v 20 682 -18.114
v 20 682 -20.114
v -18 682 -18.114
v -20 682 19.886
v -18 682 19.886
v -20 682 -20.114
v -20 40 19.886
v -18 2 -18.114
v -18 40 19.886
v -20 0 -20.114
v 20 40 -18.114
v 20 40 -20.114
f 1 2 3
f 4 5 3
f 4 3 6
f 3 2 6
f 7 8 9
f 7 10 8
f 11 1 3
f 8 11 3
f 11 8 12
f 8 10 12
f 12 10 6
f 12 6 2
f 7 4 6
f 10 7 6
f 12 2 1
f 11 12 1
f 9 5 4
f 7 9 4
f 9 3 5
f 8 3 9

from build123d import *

# Parameters (mm, degrees)
BOSS_EXTRU_1_DEPTH      = 682
ENL_V_MAT_EXTRU_1_DEPTH = 590
ENL_V_MAT_EXTRU_2_DEPTH = 590


with BuildPart() as part:
    # Esquisse1 → Boss.-Extru.1 (new body)
    with BuildSketch(Plane(origin=(0, 0, 0), x_dir=(1, 0, 0), z_dir=(0, 1, 0))):
        Polygon((-20, 20.113636364), (20, 20.113636364), (20, 18.113636364), (-18, 18.113636364), (-18, -19.886363636), (-20, -19.886363636), align=None)
    extrude(amount=BOSS_EXTRU_1_DEPTH)

    # Esquisse2 → Enlèv. mat.-Extru.1 (cut)
    with BuildSketch(Plane(origin=(0, 0, -20.113636364), x_dir=(-1, 0, 0), z_dir=(0, 0, -1))):
        Polygon((20, 0), (-20, 40), (-20, 0), align=None)
    extrude(amount=-ENL_V_MAT_EXTRU_1_DEPTH, mode=Mode.SUBTRACT)

    # Esquisse3 → Enlèv. mat.-Extru.2 (cut)
    with BuildSketch(Plane.ZY.offset(20)):
        Polygon((-20.113636364, 0), (19.886363636, 40), (19.886363636, 0), align=None)
    extrude(amount=-ENL_V_MAT_EXTRU_2_DEPTH, mode=Mode.SUBTRACT)


solid = part.part
